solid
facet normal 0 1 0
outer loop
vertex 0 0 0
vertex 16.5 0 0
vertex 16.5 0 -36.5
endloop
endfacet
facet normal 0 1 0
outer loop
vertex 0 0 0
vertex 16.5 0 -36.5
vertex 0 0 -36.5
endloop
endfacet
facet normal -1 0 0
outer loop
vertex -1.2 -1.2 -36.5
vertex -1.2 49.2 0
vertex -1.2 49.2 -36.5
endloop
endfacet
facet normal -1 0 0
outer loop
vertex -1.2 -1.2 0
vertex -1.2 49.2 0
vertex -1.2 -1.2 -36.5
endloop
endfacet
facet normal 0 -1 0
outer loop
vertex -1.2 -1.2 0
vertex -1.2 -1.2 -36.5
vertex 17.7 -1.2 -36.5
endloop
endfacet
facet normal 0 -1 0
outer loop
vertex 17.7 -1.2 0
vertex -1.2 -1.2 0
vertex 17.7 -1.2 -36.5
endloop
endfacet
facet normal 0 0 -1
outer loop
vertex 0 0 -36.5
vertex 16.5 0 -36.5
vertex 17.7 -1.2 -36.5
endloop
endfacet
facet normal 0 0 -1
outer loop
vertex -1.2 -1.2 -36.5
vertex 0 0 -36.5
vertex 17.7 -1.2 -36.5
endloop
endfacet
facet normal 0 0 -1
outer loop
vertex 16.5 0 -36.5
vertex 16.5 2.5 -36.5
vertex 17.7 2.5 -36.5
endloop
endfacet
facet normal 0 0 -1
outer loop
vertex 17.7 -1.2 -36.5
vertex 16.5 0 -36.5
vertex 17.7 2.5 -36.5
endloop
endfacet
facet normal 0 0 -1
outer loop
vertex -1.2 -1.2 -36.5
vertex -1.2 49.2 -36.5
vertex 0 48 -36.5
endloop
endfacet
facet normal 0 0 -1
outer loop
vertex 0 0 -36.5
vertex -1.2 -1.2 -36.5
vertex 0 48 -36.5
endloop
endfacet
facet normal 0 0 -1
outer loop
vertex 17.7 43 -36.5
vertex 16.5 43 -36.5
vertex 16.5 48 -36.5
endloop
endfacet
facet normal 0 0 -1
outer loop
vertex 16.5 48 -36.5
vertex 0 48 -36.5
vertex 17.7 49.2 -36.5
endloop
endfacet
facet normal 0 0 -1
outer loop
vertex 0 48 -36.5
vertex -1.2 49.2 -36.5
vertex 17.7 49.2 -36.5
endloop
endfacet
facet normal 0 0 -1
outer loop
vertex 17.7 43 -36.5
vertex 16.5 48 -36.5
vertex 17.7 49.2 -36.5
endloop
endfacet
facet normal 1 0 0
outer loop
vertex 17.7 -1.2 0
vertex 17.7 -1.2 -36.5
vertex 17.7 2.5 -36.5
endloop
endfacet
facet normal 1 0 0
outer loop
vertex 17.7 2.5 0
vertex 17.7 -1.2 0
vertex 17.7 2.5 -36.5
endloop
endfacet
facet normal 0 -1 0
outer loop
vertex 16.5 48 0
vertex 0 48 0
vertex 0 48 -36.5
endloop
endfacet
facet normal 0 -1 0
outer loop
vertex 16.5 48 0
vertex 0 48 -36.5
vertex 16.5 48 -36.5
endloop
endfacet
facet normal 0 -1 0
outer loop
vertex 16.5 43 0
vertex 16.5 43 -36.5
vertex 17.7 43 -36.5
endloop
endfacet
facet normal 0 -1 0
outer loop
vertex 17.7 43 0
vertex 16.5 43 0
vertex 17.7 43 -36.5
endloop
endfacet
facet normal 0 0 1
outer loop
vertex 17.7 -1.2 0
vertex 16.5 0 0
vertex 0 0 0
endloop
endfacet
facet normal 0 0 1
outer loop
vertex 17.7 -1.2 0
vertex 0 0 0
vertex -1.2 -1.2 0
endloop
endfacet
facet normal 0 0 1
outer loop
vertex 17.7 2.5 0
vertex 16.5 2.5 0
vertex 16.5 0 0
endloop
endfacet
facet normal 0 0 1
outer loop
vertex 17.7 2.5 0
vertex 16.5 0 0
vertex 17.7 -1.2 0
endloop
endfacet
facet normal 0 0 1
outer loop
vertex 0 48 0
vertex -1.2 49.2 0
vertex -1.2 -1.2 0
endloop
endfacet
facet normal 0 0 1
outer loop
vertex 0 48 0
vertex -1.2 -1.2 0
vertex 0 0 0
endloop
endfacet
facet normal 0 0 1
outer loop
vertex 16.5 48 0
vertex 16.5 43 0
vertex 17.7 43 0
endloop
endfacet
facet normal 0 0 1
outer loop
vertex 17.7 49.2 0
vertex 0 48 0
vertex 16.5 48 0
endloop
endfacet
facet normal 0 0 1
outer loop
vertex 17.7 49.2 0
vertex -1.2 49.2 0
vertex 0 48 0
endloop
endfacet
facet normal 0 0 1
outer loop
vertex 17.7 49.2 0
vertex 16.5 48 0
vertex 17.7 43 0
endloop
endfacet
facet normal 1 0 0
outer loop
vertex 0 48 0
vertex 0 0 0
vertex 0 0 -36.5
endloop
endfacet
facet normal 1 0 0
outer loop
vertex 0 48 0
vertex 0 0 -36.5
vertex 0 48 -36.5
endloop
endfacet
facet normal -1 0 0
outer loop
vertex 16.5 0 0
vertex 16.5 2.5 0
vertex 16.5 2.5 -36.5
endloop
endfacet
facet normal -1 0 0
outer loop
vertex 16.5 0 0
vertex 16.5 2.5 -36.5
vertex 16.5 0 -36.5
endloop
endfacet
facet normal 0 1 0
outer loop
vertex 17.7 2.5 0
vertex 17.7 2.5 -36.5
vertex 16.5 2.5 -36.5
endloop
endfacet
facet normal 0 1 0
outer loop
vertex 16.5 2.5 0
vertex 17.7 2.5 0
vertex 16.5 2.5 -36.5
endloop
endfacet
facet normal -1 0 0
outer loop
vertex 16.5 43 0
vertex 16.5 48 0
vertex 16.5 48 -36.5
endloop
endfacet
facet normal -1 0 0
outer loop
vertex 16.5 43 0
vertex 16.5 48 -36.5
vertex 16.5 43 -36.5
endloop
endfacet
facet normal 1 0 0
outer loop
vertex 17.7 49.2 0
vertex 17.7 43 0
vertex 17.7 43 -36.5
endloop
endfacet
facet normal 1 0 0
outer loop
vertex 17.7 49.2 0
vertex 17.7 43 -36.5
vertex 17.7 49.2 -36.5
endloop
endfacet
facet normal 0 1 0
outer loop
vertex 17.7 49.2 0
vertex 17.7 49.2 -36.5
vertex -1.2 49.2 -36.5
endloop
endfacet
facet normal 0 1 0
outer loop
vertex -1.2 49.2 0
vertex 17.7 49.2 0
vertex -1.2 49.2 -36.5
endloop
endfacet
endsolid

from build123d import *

# Parameters (mm, degrees)
F1_DEPTH = 36.5


with BuildPart() as f1:
    # F0 (on Top) → F1 (new body)
    with BuildSketch(Plane.XY):
        Polygon((16.5, 0), (0, 0), (0, 48), (16.5, 48), (16.5, 43), (17.7, 43), (17.7, 49.2), (-1.2, 49.2), (-1.2, -1.2), (17.7, -1.2), (17.7, 2.5), (16.5, 2.5), align=None)
    extrude(amount=-F1_DEPTH)


solid = f1.part
